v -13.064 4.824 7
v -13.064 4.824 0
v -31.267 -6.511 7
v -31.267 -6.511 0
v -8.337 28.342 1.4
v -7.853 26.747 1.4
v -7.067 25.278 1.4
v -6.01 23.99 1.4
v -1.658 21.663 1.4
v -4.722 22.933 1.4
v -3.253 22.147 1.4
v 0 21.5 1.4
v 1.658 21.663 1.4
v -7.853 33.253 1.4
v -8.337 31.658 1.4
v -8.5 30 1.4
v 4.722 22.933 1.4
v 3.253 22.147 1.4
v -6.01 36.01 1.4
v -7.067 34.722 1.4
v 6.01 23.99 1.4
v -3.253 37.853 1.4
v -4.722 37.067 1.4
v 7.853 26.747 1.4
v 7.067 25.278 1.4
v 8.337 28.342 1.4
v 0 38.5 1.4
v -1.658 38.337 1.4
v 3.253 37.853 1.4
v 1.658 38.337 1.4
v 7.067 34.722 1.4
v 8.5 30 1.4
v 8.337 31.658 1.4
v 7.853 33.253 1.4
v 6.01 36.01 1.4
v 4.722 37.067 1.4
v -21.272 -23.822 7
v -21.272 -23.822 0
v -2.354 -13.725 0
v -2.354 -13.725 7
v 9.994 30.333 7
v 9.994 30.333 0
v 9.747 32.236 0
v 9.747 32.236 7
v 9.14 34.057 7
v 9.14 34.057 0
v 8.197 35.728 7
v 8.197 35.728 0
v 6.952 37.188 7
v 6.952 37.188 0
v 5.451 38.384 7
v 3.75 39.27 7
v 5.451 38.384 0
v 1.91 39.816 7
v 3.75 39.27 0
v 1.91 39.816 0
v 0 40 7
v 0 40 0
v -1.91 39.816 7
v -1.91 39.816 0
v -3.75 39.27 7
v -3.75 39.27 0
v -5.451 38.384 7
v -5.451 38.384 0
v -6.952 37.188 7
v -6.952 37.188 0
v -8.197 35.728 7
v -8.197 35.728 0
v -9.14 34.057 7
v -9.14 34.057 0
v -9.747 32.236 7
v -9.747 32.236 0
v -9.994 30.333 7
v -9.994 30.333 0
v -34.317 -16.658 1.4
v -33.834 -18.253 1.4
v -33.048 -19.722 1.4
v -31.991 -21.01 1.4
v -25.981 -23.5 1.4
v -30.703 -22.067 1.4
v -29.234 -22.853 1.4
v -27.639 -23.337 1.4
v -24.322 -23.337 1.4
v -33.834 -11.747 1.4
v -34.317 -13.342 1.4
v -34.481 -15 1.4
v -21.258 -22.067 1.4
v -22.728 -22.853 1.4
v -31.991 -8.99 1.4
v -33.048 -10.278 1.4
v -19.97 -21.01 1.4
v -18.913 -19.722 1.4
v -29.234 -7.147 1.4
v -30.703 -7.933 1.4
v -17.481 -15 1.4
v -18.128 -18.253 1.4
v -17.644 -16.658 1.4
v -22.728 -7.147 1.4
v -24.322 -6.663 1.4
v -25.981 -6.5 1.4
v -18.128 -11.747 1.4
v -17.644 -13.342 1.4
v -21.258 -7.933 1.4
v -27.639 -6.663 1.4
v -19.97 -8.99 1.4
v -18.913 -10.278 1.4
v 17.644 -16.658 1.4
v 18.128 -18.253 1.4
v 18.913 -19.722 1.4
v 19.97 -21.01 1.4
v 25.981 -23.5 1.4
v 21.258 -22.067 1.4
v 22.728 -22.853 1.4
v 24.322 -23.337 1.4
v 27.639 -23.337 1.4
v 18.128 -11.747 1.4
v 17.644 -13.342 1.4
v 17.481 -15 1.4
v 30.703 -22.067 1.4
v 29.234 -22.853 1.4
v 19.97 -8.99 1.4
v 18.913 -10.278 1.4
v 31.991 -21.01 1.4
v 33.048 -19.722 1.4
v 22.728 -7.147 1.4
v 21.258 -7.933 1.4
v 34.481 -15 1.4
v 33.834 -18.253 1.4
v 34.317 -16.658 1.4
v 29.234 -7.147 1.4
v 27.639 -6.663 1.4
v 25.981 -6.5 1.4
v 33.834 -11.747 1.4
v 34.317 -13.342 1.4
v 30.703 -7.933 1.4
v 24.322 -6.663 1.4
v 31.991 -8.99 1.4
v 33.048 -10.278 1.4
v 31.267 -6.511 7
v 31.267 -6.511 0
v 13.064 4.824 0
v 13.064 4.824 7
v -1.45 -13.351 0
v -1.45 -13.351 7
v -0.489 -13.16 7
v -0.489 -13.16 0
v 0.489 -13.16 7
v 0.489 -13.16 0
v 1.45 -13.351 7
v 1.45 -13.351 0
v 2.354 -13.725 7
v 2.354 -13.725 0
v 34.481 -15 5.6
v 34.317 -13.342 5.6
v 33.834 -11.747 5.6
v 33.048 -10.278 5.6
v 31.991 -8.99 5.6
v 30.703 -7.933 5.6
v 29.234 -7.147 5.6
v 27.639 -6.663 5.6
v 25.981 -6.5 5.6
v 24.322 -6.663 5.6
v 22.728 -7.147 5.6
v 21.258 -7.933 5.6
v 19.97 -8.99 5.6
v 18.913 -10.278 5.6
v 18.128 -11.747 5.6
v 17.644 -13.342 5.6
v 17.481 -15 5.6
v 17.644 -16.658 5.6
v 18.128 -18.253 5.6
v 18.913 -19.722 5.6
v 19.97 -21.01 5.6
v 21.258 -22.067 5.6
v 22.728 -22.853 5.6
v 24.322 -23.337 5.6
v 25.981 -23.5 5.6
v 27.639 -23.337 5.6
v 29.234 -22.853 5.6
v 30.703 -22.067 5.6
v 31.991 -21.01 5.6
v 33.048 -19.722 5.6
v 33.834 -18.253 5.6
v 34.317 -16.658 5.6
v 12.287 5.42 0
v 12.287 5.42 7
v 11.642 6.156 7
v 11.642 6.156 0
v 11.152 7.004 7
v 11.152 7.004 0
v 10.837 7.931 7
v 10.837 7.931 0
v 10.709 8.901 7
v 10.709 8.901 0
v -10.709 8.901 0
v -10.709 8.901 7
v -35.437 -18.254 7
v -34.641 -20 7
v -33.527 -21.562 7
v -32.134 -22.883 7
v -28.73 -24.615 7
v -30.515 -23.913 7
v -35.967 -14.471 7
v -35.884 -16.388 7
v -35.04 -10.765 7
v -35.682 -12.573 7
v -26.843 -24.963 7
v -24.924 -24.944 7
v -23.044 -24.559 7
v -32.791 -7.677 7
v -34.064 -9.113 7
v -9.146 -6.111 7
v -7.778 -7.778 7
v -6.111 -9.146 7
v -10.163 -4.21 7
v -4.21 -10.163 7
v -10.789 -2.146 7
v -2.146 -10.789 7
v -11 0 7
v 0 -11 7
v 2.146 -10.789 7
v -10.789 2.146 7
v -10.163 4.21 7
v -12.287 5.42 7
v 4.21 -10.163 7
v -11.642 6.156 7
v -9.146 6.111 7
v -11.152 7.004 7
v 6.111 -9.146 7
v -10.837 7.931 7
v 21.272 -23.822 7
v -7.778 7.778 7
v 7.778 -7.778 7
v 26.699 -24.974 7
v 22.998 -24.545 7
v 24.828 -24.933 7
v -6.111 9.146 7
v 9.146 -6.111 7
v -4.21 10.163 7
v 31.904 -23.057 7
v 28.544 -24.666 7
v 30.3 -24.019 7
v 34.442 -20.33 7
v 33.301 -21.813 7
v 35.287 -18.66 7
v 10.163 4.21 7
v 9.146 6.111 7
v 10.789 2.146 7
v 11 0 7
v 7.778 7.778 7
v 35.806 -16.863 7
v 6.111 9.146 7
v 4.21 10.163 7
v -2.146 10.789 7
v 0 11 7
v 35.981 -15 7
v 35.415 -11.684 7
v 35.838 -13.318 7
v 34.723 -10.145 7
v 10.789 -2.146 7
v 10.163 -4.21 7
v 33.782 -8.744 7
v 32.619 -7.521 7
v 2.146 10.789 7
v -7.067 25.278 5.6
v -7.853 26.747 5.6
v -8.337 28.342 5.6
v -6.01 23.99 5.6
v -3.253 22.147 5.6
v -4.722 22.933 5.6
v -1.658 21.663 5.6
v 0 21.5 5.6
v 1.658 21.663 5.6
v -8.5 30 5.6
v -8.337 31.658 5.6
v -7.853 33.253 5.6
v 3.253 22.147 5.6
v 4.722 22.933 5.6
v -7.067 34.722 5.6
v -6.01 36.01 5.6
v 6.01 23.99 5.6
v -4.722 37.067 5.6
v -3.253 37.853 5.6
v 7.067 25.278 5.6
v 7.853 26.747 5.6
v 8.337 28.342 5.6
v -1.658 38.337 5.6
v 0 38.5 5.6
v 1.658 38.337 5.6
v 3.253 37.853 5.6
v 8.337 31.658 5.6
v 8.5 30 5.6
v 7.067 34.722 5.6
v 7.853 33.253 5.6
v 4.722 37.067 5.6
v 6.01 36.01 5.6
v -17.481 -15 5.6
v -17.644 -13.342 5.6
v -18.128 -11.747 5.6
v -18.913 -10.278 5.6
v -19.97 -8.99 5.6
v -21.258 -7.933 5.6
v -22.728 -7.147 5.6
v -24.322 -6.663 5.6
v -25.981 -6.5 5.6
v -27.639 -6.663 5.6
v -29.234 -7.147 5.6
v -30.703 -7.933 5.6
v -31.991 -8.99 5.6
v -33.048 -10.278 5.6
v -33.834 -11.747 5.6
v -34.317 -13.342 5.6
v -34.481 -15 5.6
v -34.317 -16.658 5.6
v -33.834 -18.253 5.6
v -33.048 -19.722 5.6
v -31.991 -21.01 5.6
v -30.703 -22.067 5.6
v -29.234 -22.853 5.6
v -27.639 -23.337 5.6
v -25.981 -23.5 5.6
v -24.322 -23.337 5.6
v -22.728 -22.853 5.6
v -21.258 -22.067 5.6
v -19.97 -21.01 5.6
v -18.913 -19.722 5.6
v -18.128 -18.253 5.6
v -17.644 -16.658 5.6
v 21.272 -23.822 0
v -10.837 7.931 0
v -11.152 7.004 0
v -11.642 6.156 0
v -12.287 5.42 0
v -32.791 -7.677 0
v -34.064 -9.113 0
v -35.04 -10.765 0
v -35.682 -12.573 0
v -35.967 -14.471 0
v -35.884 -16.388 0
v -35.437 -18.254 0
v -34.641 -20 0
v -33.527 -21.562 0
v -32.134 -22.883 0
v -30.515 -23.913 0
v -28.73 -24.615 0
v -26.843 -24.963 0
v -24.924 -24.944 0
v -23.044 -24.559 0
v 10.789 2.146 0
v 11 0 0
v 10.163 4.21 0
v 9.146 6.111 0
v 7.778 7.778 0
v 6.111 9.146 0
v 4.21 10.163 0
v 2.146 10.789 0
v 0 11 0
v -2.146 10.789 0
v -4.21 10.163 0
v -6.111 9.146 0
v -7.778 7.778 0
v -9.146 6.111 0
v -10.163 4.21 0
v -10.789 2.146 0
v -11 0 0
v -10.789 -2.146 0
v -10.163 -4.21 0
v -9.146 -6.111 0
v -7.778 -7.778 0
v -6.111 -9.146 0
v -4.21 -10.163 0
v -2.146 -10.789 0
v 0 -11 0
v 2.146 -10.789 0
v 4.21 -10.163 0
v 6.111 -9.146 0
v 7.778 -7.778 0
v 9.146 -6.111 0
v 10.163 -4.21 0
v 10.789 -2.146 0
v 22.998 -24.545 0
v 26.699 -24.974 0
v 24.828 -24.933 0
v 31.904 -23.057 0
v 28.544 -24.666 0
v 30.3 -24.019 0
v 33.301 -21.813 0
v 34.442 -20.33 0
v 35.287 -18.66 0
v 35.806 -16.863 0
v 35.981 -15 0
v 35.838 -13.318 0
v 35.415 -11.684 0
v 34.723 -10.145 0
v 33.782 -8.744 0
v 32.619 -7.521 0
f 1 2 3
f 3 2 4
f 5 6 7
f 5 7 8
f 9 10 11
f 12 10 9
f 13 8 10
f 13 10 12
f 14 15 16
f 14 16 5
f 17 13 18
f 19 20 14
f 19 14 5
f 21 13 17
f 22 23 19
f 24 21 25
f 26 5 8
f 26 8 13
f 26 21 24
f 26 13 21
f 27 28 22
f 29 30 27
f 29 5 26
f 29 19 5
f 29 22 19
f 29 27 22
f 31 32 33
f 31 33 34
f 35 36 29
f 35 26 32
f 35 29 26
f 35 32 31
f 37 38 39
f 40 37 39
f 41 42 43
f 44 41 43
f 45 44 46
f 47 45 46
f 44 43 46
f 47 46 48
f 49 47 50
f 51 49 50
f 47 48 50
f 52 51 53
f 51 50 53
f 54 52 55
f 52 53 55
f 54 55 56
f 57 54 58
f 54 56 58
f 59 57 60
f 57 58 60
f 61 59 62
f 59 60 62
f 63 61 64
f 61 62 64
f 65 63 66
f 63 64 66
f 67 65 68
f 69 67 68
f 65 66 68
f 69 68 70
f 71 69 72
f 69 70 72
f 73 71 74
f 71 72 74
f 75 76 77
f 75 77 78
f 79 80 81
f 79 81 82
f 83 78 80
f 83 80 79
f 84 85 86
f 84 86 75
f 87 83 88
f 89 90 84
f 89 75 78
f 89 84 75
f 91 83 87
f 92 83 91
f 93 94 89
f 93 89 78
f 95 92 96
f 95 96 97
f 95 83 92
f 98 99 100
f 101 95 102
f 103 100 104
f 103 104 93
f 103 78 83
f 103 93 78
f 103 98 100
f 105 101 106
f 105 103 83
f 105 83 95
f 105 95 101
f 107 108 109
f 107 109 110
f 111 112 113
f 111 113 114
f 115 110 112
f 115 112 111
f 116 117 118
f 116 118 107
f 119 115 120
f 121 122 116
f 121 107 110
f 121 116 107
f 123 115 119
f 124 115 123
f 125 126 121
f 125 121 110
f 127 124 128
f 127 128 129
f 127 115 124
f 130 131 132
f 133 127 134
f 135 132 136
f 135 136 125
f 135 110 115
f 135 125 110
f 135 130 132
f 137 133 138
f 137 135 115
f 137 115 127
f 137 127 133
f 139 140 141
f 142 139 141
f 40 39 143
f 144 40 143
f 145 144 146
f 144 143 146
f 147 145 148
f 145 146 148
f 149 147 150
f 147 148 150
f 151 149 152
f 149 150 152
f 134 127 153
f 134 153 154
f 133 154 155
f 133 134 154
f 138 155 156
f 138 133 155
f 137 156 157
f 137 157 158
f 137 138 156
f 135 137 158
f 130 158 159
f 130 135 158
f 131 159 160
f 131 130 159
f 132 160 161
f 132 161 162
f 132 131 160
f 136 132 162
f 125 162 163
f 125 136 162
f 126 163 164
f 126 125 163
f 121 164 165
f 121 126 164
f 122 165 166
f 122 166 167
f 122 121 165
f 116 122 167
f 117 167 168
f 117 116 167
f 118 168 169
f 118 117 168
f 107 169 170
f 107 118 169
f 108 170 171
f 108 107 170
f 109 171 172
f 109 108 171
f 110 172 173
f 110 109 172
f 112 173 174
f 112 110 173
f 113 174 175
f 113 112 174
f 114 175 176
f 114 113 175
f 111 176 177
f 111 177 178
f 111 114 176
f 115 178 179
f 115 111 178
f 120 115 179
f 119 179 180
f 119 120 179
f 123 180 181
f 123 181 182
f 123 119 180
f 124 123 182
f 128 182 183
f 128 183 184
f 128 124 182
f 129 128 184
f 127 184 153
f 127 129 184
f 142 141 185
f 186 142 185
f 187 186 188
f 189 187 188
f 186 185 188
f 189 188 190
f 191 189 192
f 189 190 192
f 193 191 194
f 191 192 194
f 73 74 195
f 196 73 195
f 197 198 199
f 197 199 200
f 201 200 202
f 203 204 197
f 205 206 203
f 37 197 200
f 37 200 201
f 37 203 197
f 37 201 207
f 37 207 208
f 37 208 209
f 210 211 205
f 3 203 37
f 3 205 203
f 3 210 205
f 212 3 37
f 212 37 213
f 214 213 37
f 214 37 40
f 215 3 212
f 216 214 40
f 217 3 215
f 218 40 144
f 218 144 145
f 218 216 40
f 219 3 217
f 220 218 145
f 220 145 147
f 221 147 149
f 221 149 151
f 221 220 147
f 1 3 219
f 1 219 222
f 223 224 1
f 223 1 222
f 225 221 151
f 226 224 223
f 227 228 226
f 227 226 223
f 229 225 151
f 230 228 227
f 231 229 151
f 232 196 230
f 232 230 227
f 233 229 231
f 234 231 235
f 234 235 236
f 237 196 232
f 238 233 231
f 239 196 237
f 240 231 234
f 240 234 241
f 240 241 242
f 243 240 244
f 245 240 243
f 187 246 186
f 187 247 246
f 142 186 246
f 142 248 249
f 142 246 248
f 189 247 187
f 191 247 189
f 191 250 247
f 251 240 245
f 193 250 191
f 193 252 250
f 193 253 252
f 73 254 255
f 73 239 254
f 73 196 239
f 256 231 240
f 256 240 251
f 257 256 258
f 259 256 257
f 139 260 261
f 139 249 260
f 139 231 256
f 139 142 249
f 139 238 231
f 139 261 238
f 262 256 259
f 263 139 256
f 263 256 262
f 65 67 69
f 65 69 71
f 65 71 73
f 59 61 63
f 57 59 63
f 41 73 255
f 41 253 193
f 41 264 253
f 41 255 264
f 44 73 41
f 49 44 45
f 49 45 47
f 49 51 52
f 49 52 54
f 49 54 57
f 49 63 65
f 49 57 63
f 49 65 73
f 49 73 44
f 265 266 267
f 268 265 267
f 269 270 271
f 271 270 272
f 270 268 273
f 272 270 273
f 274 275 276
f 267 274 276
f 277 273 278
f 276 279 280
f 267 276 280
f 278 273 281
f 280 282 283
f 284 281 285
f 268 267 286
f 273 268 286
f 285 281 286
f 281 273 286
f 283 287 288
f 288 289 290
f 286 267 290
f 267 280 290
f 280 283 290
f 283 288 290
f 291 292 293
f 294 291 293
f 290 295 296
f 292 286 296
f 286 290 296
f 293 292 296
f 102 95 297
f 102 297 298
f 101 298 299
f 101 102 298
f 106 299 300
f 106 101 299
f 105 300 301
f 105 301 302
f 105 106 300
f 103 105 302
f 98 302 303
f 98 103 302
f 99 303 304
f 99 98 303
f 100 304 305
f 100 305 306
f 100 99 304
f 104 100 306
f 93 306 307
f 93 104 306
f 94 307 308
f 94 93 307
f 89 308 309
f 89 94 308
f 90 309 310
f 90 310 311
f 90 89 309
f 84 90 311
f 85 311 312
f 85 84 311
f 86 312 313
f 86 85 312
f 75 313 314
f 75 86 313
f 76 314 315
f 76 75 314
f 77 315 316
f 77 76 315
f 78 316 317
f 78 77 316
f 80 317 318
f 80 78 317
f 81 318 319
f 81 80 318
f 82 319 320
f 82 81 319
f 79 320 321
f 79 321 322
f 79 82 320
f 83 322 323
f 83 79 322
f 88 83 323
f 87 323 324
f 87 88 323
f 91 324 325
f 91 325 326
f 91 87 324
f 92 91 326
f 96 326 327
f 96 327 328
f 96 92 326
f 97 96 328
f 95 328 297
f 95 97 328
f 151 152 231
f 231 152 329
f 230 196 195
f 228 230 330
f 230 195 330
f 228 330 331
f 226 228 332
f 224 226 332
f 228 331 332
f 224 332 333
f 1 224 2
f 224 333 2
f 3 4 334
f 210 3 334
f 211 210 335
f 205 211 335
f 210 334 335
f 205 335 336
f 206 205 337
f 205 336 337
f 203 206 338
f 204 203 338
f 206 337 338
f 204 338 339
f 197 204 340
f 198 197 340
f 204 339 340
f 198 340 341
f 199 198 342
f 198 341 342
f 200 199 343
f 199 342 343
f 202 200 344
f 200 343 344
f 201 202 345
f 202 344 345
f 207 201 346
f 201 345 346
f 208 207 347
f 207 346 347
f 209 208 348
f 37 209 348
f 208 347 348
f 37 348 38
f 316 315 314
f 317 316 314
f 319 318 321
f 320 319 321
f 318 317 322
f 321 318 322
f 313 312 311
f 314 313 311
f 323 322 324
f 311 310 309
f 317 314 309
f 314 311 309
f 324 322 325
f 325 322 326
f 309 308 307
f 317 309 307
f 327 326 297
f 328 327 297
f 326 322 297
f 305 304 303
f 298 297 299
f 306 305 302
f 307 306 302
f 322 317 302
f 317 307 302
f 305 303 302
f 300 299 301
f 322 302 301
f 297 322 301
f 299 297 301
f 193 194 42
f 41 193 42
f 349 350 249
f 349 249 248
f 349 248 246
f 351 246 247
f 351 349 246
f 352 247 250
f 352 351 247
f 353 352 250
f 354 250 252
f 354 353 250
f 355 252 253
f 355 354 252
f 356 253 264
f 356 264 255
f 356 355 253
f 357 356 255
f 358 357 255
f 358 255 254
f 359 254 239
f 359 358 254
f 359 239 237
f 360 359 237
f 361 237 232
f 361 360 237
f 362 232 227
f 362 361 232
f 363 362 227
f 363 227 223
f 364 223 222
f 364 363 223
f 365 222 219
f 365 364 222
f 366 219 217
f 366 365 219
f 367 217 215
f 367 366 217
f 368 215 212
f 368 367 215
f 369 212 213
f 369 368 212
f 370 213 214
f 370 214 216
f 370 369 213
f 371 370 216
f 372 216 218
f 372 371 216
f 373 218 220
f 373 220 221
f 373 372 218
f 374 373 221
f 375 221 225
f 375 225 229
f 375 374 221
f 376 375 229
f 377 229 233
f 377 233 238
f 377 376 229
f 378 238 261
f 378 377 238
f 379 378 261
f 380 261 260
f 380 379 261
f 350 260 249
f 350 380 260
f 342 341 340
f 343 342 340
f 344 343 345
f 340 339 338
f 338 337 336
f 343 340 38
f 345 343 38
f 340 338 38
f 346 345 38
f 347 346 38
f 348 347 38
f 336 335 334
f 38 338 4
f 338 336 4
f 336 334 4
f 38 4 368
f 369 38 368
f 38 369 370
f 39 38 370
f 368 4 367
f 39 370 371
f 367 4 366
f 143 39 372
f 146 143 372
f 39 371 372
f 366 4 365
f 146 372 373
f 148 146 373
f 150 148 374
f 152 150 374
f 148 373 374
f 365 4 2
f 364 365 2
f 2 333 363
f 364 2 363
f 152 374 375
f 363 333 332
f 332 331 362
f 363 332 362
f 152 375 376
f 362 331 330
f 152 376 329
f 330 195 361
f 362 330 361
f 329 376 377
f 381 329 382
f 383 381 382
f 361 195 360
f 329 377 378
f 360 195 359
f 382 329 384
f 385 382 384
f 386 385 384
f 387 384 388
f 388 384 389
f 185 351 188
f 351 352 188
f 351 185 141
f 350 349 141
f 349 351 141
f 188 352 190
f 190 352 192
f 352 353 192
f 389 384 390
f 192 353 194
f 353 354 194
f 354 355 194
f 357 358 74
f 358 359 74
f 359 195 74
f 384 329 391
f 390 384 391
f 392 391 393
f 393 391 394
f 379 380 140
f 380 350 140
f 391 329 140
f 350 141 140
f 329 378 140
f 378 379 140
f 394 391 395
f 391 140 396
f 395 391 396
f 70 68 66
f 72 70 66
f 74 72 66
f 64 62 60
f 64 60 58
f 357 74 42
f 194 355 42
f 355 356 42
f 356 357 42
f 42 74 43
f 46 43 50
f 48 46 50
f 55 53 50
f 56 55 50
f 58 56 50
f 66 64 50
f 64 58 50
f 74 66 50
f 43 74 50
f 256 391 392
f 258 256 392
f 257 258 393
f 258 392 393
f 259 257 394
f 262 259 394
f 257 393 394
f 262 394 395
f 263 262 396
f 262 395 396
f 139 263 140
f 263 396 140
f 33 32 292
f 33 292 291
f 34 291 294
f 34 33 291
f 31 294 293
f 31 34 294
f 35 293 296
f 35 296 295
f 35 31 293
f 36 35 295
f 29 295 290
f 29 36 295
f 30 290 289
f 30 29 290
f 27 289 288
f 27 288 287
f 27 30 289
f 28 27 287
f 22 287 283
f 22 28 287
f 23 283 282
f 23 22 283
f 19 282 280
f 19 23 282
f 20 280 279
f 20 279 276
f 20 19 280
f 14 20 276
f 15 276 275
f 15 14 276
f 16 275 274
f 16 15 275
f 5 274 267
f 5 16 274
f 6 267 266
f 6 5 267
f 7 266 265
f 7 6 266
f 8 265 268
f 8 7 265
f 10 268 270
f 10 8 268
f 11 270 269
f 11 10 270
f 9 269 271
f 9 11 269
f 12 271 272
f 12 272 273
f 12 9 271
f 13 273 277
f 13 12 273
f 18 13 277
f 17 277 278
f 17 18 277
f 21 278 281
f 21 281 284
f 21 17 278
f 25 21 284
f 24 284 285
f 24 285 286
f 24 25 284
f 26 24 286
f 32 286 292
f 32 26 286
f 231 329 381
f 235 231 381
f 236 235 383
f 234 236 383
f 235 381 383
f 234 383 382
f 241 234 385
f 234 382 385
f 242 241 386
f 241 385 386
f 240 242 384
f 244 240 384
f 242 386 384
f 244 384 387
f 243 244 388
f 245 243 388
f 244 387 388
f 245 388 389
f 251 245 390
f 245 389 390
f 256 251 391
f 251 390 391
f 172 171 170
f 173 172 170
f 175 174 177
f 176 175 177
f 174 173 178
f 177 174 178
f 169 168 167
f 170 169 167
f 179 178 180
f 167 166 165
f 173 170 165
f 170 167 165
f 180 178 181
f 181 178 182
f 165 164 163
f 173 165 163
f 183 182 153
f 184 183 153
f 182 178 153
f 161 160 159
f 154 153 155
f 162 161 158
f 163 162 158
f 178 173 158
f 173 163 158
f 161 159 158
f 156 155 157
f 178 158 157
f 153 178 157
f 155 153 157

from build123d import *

# Parameters (mm, degrees)
F0_R     = 11
F1_DEPTH = 7
F3_R     = 8.5
F4_DEPTH = 4.2


# Not quite as in the source:
# - a feature names something its author has since deleted; it is built from what else it names


with BuildPart() as f1:
    # F0 (on Top) → F1 (new body)
    with BuildSketch(Plane.XY):
        with BuildLine():
            ThreePointArc((9.9944429004, 30.3333333333), (9.9986106286, 30.1666898261), (10, 30))
            ThreePointArc((10, 30), (-0.1666898261, 20.0013893714), (-9.9944429004, 30.3333333333))
            Line((-9.9944429004, 30.3333333333), (-10.7092358725, 8.9014606966))
            ThreePointArc((-10.7092358725, 8.9014606966), (-11.3763303038, 6.5681273633), (-13.0635090303, 4.8237399724))
            Line((-13.0635090303, 4.8237399724), (-31.2666586983, -6.5112252183))
            ThreePointArc((-31.2666586983, -6.5112252183), (-21.1258144232, -6.2576042801), (-15.9807621135, -15))
            ThreePointArc((-15.9807621135, -15), (-17.4050562197, -20.1436629382), (-21.2722157979, -23.8221081151))
            Line((-21.2722157979, -23.8221081151), (-2.3542731578, -13.725200669))
            ThreePointArc((-2.3542731578, -13.725200669), (0, -13.1362547266), (2.3542731578, -13.725200669))
            Line((2.3542731578, -13.725200669), (21.2722157979, -23.8221081151))
            ThreePointArc((21.2722157979, -23.8221081151), (17.3205080757, -10), (31.2666586983, -6.5112252183))
            Line((31.2666586983, -6.5112252183), (13.0635090303, 4.8237399724))
            ThreePointArc((13.0635090303, 4.8237399724), (11.3763303038, 6.5681273633), (10.7092358725, 8.9014606966))
            Line((10.7092358725, 8.9014606966), (9.9944429004, 30.3333333333))
        make_face()
        Circle(F0_R, mode=Mode.SUBTRACT)
        with BuildLine():
            ThreePointArc((-9.9944429004, 30.3333333333), (-0.1666898261, 20.0013893714), (10, 30))
            ThreePointArc((10, 30), (9.9986106286, 30.1666898261), (9.9944429004, 30.3333333333))
            ThreePointArc((9.9944429004, 30.3333333333), (0, 40), (-9.9944429004, 30.3333333333))
        make_face()
        with BuildLine():
            ThreePointArc((-15.9807621135, -15), (-21.1258144232, -6.2576042801), (-31.2666586983, -6.5112252183))
            ThreePointArc((-31.2666586983, -6.5112252183), (-34.6410161514, -20), (-21.2722157979, -23.8221081151))
            ThreePointArc((-21.2722157979, -23.8221081151), (-17.4050562197, -20.1436629382), (-15.9807621135, -15))
        make_face()
        with BuildLine():
            ThreePointArc((35.9807621135, -15), (34.7231578335, -10.1450523096), (31.2666586983, -6.5112252183))
            ThreePointArc((31.2666586983, -6.5112252183), (17.3205080757, -10), (21.2722157979, -23.8221081151))
            ThreePointArc((21.2722157979, -23.8221081151), (31.1244250518, -23.5757058939), (35.9807621135, -15))
        make_face()
    extrude(amount=F1_DEPTH)

    # F3 (on offset) → F4 (cut)
    with BuildSketch(Plane.XY.offset(1.4)):
        with Locations((25.9807621135, -15)):
            Circle(F3_R)
        with Locations((-25.9807621135, -15)):
            Circle(F3_R)
        with Locations((0, 30)):
            Circle(F3_R)
    extrude(amount=F4_DEPTH, mode=Mode.SUBTRACT)


solid = f1.part
